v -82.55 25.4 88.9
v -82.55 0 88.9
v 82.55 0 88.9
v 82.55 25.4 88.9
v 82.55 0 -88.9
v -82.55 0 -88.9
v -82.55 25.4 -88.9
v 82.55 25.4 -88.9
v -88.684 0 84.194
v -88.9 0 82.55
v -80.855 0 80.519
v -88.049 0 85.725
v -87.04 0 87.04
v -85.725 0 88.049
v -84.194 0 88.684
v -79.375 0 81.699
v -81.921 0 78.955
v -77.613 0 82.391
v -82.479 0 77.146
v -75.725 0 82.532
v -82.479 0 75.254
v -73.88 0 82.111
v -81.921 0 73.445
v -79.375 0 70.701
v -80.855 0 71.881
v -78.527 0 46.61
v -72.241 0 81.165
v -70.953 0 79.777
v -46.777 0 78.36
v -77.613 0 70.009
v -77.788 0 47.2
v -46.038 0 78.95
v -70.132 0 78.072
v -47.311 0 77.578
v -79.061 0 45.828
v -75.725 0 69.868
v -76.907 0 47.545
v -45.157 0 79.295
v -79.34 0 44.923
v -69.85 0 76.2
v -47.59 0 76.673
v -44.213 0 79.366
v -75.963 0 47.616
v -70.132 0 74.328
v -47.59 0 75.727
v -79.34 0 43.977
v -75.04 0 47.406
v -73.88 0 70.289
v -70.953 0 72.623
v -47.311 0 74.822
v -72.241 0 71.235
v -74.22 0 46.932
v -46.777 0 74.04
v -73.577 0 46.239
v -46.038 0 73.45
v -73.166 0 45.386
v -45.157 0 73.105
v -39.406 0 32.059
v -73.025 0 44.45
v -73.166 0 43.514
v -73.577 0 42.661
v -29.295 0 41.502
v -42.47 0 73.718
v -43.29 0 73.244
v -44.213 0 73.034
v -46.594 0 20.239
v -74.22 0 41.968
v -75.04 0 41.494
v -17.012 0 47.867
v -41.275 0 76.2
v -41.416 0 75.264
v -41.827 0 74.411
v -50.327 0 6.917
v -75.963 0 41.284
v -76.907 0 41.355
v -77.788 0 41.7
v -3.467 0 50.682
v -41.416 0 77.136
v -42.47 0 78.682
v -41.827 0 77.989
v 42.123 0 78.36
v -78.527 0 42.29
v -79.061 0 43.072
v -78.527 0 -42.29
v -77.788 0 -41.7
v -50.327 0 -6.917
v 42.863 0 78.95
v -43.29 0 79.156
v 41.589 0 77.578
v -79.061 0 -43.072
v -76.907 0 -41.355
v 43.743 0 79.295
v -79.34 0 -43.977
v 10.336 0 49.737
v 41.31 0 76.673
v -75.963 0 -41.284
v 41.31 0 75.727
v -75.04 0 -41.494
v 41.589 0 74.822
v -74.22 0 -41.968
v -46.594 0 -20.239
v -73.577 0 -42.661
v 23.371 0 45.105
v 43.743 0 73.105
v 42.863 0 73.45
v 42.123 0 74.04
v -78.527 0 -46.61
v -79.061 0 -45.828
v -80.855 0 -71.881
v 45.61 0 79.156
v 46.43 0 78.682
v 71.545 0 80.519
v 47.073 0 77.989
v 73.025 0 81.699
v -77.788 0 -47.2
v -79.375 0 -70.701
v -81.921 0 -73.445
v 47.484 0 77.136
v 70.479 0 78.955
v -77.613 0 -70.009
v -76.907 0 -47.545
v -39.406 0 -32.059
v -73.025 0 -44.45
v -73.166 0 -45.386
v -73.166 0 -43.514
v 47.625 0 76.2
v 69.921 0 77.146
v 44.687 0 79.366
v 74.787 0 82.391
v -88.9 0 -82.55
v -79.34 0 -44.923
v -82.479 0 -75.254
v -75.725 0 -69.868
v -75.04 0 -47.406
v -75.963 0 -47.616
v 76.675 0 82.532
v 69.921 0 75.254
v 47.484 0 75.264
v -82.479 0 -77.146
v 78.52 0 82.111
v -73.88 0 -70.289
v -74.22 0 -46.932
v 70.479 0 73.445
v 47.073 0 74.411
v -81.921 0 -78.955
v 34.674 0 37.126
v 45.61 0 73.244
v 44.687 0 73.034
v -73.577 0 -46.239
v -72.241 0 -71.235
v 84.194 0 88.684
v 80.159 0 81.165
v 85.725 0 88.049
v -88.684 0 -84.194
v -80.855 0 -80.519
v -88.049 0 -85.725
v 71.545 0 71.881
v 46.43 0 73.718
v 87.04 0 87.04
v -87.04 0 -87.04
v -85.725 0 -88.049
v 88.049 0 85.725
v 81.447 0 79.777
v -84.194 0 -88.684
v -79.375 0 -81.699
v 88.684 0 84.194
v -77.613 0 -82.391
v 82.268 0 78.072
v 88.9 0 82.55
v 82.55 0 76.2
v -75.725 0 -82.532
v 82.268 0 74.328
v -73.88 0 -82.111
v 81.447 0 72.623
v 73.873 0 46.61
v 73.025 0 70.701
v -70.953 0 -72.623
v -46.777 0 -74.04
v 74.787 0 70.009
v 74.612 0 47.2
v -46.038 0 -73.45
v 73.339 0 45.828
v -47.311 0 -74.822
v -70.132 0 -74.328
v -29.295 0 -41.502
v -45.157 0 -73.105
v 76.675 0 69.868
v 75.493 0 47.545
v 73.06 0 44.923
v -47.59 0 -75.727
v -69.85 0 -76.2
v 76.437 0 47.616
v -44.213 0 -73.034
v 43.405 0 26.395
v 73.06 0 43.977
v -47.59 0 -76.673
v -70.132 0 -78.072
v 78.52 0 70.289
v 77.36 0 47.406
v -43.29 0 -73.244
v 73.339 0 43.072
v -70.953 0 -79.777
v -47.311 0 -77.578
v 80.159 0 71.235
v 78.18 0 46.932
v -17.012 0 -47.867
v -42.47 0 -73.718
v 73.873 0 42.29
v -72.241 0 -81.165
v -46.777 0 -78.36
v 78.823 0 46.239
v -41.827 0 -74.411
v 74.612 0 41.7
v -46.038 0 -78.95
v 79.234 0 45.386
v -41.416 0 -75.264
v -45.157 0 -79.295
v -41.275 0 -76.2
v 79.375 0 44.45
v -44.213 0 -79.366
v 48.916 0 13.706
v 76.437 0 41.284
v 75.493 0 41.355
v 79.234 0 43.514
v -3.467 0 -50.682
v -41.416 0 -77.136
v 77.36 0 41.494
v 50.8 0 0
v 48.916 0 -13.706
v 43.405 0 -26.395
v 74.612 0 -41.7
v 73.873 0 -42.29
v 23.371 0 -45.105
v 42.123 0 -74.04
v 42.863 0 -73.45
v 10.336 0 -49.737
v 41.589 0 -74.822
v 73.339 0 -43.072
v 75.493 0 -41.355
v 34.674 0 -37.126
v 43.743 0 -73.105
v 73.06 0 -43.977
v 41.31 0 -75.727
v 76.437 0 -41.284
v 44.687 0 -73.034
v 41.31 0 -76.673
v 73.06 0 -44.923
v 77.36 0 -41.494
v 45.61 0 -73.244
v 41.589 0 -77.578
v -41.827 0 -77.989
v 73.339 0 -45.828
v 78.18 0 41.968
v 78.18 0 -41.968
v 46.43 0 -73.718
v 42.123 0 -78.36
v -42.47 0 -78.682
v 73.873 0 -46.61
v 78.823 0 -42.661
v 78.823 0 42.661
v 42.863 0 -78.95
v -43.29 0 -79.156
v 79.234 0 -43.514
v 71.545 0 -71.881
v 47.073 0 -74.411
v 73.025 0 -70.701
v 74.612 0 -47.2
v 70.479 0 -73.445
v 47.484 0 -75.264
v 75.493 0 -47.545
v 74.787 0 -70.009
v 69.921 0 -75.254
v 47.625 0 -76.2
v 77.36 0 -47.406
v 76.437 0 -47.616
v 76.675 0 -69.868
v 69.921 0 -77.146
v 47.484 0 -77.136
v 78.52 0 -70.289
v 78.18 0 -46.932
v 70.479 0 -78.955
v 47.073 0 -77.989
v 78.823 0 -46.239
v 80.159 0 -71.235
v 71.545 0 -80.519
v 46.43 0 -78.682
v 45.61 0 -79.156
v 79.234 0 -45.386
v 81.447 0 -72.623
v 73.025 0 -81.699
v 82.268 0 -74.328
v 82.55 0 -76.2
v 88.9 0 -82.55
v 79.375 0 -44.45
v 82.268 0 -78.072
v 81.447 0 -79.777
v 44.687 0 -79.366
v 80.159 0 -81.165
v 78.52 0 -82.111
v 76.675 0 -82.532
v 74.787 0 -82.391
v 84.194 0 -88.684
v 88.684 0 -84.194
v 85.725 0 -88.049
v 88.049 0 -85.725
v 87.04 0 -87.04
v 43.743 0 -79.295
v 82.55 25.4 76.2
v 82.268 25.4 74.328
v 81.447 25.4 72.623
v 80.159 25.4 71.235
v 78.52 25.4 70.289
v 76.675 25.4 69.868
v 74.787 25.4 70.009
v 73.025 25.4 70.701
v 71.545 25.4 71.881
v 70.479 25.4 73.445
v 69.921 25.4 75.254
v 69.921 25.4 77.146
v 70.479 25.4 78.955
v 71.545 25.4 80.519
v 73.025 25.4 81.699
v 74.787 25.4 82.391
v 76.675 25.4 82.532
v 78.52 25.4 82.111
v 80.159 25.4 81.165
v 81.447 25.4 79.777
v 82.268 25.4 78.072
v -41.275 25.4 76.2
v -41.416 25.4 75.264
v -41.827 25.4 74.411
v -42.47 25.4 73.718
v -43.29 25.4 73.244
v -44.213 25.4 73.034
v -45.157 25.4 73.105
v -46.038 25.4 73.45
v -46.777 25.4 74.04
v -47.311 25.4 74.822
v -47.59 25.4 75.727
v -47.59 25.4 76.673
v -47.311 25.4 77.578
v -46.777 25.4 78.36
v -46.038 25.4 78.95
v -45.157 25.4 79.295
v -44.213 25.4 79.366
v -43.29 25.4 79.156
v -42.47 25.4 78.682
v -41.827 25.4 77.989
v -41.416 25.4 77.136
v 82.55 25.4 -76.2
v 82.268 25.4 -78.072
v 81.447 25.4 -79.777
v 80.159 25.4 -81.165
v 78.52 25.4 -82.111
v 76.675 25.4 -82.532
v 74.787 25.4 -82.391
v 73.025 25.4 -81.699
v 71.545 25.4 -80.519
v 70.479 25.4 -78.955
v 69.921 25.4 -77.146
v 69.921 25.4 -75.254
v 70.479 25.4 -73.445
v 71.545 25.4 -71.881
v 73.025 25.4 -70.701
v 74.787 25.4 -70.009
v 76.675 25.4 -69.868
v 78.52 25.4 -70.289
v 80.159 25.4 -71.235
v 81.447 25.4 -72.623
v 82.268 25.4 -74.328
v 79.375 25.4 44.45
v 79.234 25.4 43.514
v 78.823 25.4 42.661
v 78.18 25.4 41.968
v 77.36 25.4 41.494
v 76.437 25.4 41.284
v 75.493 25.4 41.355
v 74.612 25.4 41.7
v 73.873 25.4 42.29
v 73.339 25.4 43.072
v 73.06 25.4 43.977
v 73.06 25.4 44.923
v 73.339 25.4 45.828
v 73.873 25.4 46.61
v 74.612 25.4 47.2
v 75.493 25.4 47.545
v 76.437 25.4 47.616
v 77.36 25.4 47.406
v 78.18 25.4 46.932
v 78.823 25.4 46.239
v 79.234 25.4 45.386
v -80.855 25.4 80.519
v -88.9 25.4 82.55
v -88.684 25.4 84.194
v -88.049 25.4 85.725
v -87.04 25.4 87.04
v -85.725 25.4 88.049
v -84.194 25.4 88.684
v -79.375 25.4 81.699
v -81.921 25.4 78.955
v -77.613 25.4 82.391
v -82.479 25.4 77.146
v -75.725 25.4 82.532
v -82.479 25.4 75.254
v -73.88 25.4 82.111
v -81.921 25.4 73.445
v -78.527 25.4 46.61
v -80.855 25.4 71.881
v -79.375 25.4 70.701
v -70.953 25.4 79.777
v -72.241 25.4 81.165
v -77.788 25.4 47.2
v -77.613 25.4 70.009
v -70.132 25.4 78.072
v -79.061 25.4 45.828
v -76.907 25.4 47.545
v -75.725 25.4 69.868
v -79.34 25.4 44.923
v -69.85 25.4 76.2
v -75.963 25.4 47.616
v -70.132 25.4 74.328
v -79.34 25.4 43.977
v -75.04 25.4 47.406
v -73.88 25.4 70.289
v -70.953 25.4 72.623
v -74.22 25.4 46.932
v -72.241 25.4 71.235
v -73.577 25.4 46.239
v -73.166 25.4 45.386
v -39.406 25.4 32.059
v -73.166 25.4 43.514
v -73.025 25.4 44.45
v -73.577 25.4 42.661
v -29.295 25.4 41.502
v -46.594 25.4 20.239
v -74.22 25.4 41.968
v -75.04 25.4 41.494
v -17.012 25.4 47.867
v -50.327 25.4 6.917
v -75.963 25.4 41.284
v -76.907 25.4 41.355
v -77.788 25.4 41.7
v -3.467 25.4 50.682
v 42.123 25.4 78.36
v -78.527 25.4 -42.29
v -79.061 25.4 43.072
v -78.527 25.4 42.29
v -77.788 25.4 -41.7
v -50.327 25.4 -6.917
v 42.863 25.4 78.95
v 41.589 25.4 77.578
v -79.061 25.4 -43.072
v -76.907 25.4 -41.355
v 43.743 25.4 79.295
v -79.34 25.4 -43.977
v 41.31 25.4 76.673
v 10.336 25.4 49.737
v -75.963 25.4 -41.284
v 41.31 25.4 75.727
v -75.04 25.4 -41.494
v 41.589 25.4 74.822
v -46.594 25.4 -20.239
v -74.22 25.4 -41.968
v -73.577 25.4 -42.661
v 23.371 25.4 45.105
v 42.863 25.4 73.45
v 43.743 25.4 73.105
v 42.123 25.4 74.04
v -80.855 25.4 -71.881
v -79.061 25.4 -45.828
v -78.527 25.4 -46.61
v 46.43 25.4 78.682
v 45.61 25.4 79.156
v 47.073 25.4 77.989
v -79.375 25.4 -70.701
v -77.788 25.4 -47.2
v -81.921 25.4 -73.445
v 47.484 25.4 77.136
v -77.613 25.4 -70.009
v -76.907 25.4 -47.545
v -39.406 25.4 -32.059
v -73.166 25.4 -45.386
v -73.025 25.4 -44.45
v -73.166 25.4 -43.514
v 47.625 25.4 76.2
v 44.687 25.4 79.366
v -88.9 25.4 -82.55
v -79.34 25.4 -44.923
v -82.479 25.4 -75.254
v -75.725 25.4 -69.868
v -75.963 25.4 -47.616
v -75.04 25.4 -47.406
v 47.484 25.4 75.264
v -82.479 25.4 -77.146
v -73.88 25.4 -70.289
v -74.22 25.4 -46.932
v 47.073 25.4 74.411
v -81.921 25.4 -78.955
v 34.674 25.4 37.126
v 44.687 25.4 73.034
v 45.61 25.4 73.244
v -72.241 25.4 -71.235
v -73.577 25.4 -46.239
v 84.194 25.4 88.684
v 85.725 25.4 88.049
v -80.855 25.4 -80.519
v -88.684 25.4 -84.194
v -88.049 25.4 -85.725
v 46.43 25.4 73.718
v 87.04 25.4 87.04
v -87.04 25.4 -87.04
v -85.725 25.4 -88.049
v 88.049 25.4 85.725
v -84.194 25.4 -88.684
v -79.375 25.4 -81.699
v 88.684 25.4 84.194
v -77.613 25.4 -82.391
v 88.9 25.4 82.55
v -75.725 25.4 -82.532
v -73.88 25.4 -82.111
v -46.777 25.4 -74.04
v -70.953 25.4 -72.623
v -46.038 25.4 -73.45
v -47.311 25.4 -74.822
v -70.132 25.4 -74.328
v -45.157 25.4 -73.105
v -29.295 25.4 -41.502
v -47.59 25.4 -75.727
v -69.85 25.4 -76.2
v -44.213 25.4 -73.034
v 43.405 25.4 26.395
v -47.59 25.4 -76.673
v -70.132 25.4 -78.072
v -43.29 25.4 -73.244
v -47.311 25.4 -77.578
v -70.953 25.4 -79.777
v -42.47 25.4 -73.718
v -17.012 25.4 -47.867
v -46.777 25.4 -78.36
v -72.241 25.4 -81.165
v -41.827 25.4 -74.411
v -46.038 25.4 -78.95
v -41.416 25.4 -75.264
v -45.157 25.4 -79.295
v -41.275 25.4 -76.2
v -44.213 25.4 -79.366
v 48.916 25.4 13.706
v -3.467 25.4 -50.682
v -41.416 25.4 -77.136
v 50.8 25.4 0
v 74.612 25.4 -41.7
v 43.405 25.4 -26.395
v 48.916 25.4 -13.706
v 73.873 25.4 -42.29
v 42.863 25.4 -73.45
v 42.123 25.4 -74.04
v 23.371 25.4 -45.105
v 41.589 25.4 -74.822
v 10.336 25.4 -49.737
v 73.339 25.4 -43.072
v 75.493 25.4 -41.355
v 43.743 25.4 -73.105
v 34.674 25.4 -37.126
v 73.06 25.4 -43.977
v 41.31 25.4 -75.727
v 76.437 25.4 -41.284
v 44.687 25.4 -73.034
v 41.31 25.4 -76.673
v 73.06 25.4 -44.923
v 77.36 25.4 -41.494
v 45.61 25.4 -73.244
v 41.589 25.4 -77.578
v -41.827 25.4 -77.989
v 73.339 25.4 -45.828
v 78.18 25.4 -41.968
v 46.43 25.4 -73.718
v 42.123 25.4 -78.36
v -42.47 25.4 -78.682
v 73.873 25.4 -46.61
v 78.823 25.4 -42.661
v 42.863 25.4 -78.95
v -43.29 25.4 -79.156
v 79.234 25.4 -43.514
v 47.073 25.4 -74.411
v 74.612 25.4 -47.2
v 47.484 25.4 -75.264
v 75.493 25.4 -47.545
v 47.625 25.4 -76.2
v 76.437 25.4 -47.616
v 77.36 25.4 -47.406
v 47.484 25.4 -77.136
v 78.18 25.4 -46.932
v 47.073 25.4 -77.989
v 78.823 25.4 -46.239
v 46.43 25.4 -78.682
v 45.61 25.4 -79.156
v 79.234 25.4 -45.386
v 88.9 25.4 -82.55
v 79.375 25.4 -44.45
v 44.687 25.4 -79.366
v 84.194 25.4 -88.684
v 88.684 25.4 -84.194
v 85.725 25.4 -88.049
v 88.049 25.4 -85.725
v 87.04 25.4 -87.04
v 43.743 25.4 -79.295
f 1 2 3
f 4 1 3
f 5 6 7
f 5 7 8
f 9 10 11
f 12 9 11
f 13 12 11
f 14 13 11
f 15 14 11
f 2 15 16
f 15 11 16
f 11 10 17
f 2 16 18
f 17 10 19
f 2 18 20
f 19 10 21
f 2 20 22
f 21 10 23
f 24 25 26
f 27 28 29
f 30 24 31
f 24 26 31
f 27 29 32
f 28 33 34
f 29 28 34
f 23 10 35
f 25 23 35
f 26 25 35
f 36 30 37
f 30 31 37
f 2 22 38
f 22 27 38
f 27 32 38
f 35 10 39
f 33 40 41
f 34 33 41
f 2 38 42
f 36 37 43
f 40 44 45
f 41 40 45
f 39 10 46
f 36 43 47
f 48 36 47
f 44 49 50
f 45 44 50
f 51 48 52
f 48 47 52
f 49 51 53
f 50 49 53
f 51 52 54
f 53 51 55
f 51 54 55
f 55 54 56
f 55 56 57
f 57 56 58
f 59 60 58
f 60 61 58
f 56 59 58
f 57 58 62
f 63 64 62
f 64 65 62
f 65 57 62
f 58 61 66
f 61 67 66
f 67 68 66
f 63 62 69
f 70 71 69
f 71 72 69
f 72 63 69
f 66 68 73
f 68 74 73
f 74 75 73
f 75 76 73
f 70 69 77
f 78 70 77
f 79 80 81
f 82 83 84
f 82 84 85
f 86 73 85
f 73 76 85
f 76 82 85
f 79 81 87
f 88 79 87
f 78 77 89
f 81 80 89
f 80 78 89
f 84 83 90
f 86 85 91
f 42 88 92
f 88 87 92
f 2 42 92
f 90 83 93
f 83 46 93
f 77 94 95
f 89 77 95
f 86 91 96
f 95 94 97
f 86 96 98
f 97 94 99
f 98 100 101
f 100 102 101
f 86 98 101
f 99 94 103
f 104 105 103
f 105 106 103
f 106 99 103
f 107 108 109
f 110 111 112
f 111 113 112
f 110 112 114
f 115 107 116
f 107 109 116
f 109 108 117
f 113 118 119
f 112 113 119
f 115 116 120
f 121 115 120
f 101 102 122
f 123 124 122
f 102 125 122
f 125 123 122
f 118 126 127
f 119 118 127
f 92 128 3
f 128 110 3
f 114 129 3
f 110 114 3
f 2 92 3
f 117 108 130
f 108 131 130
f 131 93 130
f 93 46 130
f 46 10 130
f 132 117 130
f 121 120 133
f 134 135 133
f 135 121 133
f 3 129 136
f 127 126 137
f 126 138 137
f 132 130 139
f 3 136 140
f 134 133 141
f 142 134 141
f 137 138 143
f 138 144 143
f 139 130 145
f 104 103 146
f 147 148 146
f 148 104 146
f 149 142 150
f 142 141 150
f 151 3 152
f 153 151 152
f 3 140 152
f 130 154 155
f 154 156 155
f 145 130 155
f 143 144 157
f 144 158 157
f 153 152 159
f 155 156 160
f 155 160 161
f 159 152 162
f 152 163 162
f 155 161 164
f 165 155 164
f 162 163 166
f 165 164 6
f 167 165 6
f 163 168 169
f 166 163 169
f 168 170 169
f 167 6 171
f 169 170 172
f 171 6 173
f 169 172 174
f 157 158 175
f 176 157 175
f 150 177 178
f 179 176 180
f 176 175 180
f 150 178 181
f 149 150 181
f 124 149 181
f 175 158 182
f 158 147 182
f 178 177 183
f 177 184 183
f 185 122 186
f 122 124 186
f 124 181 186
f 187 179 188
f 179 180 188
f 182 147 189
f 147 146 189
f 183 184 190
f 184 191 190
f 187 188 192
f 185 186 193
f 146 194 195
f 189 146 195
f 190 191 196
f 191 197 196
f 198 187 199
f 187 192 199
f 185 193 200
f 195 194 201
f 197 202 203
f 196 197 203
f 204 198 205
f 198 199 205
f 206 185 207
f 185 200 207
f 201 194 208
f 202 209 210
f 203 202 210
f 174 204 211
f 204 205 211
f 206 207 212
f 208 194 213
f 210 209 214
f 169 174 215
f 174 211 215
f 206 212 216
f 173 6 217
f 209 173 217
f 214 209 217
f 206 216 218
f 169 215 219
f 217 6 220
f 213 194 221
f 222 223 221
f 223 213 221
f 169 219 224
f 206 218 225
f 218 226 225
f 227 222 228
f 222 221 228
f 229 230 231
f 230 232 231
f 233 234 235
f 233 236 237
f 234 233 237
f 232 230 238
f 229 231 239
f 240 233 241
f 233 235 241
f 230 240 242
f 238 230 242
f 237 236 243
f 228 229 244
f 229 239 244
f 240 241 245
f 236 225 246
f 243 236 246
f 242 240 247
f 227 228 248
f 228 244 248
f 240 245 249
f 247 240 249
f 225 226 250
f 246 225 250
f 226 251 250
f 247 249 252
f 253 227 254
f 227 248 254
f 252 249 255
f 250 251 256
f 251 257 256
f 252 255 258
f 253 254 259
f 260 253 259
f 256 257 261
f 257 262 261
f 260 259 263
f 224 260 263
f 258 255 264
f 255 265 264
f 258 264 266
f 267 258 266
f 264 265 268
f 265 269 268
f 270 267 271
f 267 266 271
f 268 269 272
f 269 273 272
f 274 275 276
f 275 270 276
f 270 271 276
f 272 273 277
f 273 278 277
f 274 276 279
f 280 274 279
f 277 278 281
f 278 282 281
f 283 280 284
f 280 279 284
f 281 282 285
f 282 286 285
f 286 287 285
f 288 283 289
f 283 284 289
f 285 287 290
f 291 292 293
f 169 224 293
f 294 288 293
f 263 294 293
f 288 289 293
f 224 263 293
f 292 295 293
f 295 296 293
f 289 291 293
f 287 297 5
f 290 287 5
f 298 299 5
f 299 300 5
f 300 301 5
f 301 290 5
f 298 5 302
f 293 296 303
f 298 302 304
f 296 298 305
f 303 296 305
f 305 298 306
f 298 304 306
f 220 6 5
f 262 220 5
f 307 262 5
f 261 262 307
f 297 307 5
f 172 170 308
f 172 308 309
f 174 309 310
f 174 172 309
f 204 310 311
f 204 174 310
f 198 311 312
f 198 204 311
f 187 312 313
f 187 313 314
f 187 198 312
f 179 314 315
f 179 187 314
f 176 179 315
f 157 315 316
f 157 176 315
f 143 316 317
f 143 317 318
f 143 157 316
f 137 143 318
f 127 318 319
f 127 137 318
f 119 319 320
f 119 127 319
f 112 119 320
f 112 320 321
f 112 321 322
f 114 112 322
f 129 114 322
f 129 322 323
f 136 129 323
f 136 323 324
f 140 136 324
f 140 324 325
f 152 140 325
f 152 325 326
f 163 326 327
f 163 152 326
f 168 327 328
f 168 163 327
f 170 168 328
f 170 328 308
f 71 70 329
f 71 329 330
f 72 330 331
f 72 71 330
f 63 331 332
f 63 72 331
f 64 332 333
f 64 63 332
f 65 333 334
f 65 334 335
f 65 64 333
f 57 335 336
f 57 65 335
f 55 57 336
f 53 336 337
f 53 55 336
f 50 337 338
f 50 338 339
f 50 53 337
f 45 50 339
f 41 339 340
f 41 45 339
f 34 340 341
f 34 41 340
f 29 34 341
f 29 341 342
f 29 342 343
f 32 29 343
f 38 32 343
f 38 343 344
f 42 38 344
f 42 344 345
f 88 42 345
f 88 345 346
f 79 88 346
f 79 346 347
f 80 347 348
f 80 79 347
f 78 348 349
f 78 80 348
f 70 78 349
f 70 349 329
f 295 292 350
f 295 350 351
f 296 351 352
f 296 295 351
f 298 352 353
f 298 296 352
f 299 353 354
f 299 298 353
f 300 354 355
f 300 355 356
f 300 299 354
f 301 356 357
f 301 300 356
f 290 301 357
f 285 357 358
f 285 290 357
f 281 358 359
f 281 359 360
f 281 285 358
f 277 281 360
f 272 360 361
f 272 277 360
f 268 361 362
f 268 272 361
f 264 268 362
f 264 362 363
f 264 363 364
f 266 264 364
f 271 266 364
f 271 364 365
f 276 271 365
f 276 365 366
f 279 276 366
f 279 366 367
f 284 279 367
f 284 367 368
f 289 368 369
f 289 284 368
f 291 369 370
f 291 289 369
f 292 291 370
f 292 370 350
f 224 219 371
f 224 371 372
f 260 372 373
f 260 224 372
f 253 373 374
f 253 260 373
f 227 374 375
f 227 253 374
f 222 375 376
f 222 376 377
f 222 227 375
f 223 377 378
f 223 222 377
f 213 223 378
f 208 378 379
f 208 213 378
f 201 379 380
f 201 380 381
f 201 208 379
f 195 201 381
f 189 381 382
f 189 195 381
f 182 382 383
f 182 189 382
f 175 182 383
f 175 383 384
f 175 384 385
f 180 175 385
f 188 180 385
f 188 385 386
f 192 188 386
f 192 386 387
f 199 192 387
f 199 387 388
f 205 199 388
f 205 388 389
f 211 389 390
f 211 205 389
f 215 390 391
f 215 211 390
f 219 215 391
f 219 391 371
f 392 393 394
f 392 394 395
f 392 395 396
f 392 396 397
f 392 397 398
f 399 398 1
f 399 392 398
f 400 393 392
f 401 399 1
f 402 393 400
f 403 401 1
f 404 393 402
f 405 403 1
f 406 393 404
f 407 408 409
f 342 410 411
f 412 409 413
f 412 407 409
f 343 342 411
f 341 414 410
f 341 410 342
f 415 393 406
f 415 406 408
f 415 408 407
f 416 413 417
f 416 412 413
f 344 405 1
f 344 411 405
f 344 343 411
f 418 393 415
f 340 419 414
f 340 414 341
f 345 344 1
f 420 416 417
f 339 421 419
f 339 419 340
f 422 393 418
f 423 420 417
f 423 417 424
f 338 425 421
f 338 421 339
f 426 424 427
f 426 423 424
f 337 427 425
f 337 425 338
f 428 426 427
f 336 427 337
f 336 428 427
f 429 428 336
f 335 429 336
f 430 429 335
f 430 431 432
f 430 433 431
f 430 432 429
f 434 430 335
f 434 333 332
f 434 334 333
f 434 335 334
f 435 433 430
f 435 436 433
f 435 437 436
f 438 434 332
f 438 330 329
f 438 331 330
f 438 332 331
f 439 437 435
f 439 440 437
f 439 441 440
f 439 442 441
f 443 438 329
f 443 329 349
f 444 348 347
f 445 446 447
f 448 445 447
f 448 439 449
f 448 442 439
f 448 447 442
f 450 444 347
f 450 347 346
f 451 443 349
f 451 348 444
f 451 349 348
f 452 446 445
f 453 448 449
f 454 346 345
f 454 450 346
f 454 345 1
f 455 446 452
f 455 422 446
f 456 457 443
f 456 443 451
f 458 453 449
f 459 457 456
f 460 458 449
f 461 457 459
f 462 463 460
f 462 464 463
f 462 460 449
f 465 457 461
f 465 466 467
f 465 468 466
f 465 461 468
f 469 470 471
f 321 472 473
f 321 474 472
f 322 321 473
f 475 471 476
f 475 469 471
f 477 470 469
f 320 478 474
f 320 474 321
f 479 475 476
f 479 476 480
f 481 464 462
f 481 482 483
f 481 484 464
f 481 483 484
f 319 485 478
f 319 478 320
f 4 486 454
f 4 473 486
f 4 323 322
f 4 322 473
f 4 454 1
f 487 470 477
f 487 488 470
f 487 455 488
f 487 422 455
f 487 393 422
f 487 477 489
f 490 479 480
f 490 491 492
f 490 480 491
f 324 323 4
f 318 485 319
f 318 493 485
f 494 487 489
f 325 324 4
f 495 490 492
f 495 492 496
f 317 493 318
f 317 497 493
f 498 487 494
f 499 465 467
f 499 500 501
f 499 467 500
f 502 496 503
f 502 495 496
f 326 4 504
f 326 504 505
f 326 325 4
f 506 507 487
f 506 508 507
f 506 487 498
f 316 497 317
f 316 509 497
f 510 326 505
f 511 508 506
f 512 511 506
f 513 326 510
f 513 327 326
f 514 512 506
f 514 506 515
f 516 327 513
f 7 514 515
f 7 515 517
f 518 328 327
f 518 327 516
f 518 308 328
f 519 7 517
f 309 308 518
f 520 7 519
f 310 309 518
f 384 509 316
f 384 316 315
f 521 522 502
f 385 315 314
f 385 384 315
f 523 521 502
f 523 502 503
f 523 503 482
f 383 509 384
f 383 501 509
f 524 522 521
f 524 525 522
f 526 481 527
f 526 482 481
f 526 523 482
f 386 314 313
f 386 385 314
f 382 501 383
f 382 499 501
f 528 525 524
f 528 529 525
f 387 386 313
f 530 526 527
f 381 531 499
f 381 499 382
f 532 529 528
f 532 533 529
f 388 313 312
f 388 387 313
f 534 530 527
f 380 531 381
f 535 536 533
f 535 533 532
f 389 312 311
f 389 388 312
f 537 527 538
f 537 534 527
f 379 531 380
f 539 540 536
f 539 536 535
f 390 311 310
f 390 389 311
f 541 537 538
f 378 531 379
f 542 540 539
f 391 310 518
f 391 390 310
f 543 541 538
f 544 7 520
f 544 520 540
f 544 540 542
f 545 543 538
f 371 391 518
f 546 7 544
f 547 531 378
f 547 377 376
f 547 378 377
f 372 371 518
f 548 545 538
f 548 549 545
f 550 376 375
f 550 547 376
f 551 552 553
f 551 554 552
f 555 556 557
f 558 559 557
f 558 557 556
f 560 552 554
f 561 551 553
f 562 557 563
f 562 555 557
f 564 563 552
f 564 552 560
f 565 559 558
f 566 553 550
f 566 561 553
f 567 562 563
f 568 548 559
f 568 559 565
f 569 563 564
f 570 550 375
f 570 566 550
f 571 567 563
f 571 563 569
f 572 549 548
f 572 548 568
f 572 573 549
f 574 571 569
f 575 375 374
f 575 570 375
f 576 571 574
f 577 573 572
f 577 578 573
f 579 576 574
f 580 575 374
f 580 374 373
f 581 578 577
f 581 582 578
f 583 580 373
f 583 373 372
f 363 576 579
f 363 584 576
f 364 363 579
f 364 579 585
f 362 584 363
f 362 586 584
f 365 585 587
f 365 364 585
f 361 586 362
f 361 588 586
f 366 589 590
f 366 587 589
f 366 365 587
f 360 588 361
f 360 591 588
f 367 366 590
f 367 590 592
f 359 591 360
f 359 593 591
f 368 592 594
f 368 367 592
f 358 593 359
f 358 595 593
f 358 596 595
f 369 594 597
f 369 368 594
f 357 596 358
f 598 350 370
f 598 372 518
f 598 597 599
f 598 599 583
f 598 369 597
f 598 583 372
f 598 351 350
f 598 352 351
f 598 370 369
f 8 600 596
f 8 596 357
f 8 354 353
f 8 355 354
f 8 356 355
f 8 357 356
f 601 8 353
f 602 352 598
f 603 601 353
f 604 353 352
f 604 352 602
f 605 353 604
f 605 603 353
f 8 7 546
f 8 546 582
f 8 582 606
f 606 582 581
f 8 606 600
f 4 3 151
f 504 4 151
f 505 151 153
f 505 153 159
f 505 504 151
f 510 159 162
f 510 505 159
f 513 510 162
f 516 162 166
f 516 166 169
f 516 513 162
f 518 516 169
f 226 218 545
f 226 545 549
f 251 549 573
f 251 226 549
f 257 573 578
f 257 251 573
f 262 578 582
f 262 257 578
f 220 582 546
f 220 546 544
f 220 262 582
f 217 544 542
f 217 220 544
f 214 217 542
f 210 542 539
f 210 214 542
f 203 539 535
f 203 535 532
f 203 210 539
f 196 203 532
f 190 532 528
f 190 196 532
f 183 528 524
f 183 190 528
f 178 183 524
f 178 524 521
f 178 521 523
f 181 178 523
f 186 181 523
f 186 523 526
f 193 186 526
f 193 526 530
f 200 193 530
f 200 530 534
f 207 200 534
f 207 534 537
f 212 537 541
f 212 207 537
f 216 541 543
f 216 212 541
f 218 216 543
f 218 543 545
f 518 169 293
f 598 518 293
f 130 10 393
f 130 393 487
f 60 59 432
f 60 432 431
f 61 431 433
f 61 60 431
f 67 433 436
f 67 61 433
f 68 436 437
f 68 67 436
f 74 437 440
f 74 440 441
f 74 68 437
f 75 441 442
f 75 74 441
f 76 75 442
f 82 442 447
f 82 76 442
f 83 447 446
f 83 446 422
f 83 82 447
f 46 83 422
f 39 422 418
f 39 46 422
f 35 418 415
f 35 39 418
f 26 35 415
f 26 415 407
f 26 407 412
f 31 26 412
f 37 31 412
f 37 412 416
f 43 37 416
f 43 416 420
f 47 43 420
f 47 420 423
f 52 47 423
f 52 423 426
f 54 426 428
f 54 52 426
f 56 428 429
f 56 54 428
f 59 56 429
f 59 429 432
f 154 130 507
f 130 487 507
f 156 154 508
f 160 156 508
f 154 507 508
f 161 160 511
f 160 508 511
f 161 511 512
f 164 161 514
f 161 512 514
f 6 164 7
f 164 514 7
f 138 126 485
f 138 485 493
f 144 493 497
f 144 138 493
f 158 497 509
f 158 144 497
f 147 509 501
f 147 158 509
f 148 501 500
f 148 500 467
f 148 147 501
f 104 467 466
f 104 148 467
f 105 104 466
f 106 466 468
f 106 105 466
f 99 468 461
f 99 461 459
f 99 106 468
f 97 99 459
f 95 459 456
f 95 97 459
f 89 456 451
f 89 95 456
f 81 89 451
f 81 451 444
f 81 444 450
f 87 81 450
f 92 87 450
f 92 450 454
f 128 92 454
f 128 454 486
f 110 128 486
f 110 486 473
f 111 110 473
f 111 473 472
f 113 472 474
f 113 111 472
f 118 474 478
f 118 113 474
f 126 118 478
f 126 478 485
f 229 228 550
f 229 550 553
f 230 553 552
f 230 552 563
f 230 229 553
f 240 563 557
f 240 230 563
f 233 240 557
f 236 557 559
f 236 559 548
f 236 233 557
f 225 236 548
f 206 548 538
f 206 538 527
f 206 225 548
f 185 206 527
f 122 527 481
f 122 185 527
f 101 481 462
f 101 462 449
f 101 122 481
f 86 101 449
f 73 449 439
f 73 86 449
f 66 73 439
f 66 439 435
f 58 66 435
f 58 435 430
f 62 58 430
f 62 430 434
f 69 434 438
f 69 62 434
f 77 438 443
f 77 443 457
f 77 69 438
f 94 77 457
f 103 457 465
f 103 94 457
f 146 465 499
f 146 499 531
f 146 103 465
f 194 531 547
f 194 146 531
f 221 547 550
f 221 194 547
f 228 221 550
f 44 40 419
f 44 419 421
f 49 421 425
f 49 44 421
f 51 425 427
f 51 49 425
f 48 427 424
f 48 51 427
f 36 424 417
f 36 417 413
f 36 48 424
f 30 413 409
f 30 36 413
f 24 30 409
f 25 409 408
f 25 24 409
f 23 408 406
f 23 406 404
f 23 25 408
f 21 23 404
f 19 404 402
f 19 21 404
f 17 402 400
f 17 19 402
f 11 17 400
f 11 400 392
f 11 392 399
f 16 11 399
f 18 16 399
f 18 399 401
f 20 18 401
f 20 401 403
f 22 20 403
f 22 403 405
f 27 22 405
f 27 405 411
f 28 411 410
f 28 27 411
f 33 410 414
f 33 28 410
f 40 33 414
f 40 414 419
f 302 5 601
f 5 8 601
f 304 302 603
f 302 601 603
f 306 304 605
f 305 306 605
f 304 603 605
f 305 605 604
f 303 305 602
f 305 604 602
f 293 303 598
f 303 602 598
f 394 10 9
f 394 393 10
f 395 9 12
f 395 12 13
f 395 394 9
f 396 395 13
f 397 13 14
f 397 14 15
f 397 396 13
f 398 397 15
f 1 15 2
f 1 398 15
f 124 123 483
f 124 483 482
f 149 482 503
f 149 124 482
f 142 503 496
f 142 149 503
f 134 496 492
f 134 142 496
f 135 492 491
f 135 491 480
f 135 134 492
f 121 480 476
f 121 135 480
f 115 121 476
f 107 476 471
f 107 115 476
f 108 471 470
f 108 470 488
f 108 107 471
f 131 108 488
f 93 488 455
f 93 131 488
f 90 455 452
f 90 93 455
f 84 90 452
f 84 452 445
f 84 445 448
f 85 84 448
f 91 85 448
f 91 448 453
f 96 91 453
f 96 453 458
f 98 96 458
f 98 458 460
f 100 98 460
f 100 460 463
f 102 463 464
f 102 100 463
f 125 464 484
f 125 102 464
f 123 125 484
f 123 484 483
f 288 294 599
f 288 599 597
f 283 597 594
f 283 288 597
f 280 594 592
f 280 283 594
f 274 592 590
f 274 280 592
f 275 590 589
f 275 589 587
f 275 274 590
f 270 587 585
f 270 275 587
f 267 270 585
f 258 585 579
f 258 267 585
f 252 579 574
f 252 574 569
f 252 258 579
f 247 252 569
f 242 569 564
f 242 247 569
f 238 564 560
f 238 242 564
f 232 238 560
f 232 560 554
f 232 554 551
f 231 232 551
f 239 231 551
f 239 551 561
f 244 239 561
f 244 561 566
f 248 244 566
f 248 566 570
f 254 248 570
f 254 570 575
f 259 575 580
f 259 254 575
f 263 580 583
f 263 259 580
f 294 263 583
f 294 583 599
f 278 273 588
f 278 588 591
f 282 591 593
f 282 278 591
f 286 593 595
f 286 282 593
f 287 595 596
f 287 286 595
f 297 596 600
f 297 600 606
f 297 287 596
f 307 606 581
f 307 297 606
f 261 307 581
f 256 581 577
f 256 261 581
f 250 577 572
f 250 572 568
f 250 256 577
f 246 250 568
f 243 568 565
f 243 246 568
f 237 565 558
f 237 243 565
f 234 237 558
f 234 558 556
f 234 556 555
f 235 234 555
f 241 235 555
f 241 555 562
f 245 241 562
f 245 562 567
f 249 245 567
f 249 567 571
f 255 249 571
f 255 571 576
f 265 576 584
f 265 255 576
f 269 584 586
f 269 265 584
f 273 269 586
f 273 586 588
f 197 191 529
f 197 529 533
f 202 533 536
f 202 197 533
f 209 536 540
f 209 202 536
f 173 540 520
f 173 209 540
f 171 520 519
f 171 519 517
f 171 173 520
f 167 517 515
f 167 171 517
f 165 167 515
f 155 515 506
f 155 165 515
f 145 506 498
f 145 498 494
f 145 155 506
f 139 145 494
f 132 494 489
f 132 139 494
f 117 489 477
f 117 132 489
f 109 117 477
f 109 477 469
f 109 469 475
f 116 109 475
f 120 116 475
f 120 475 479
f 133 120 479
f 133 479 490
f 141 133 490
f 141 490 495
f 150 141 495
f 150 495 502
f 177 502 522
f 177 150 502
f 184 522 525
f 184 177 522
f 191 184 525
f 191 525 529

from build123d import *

# Parameters (mm, degrees)
SKETCH1_W           = 177.8
SKETCH1_H           = 177.8
SKETCH1_R           = 50.8
SKETCH1_R_2         = 3.175
SKETCH1_R_3         = 6.35
BOSS_EXTRUDE1_DEPTH = 25.4
FILLET1_R           = 6.35


with BuildPart() as part:
    # Sketch1 → Boss-Extrude1 (new body)
    with BuildSketch(Plane(origin=(0, 0, 0), x_dir=(1, 0, 0), z_dir=(0, 1, 0))):
        Rectangle(SKETCH1_W, SKETCH1_H)
        Circle(SKETCH1_R, mode=Mode.SUBTRACT)
        with Locations((44.45, 76.2)):
            Circle(SKETCH1_R_2, mode=Mode.SUBTRACT)
        with Locations((-44.45, 76.2)):
            Circle(SKETCH1_R_2, mode=Mode.SUBTRACT)
        with Locations((-76.2, 76.2)):
            Circle(SKETCH1_R_3, mode=Mode.SUBTRACT)
        with Locations((-76.2, -76.2)):
            Circle(SKETCH1_R_3, mode=Mode.SUBTRACT)
        with Locations((76.2, -76.2)):
            Circle(SKETCH1_R_3, mode=Mode.SUBTRACT)
        with Locations((76.2, 76.2)):
            Circle(SKETCH1_R_3, mode=Mode.SUBTRACT)
        with Locations((76.2, 44.45)):
            Circle(SKETCH1_R_2, mode=Mode.SUBTRACT)
        with Locations((76.2, -44.45)):
            Circle(SKETCH1_R_2, mode=Mode.SUBTRACT)
        with Locations((44.45, -76.2)):
            Circle(SKETCH1_R_2, mode=Mode.SUBTRACT)
        with Locations((-44.45, -76.2)):
            Circle(SKETCH1_R_2, mode=Mode.SUBTRACT)
        with Locations((-76.2, -44.45)):
            Circle(SKETCH1_R_2, mode=Mode.SUBTRACT)
        with Locations((-76.2, 44.45)):
            Circle(SKETCH1_R_2, mode=Mode.SUBTRACT)
    extrude(amount=BOSS_EXTRUDE1_DEPTH)

    # Fillet1
    fillet1_edges = [part.edges().sort_by_distance(p)[0] for p in [
        (-88.9, 12.7, -88.9),
        (88.9, 12.7, -88.9),
        (88.9, 12.7, 88.9),
        (-88.9, 12.7, 88.9),
    ]]
    fillet(fillet1_edges, radius=FILLET1_R)


solid = part.part
